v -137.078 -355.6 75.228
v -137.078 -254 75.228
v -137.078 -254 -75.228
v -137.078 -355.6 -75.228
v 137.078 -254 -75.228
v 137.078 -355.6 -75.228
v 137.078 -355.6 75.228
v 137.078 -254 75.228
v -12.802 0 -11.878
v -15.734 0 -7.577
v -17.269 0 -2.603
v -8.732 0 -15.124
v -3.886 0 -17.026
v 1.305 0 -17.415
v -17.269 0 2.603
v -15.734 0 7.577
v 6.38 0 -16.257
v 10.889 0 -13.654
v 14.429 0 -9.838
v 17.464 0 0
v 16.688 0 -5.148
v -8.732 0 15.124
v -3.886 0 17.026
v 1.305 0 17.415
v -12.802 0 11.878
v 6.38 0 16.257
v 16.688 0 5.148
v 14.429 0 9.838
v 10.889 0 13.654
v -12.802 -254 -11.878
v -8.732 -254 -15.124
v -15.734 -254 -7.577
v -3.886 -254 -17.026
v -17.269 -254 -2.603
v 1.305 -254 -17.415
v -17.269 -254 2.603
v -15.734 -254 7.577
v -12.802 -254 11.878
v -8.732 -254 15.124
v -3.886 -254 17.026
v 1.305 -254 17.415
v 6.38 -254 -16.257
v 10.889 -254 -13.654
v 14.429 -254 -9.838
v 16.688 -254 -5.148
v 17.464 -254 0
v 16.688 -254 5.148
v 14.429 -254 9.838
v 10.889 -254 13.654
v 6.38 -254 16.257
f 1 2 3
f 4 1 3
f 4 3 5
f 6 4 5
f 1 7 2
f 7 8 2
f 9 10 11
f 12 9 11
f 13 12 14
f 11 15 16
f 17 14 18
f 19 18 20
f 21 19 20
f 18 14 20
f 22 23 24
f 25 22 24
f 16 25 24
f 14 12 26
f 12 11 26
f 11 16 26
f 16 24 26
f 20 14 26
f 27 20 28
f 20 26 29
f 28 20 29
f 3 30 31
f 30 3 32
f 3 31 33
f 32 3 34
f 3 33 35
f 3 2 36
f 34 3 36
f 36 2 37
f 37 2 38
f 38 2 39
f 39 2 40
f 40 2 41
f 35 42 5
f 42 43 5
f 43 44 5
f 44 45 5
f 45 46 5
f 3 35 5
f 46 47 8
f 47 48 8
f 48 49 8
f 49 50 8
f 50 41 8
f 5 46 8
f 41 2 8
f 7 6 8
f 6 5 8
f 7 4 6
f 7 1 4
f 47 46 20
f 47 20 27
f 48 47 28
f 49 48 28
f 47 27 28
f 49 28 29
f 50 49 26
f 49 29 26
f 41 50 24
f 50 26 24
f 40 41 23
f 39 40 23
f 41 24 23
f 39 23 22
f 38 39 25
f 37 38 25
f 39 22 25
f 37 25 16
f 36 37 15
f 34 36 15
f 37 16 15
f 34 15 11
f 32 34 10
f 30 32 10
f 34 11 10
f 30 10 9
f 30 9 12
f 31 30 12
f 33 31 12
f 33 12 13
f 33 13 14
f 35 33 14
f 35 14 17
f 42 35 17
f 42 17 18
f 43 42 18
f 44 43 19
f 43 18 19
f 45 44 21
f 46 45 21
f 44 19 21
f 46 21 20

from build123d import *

# Parameters (mm, degrees)
F0_R     = 17.4638157323
F1_DEPTH = 254
F3_DEPTH = 76.2
F4_DEPTH = 25.4


with BuildPart() as f1:
    # F0 (on Front) → F1 (new body)
    with BuildSketch(Plane.XZ):
        Circle(F0_R)
    extrude(amount=F1_DEPTH)

    # F2 (on face) → F3 (join)
    with BuildSketch(Plane.XZ.offset(254)):
        with BuildLine():
            Line((-17.4638157323, 0), (0, 0))
            Line((0, 0), (0, 17.4638157323))
            ThreePointArc((0, 17.4638157323), (-12.3487825297, 12.3487825297), (-17.4638157323, 0))
        make_face()
        with BuildLine():
            Line((0, -17.4638157323), (0, 0))
            Line((0, 0), (-17.4638157323, 0))
            ThreePointArc((-17.4638157323, 0), (-12.3487825297, -12.3487825297), (0, -17.4638157323))
        make_face()
        with BuildLine():
            ThreePointArc((0, -17.4638157323), (-12.3487825297, -12.3487825297), (-17.4638157323, 0))
            Line((-17.4638157323, 0), (-137.0784789324, 0))
            Line((-137.0784789324, 0), (-137.0784789324, -75.2277523279))
            Line((-137.0784789324, -75.2277523279), (0, -75.2277523279))
            Line((0, -75.2277523279), (0, -17.4638157323))
        make_face()
        with BuildLine():
            Line((0, 17.4638157323), (0, 0))
            Line((0, 0), (17.4638157323, 0))
            ThreePointArc((17.4638157323, 0), (12.3487825297, 12.3487825297), (0, 17.4638157323))
        make_face()
        with BuildLine():
            Line((0, 75.2277523279), (0, 17.4638157323))
            ThreePointArc((0, 17.4638157323), (12.3487825297, 12.3487825297), (17.4638157323, 0))
            Line((17.4638157323, 0), (137.0784789324, 0))
            Line((137.0784789324, 0), (137.0784789324, 75.2277523279))
            Line((137.0784789324, 75.2277523279), (0, 75.2277523279))
        make_face()
        with BuildLine():
            Line((137.0784789324, 0), (17.4638157323, 0))
            ThreePointArc((17.4638157323, 0), (12.3487825297, -12.3487825297), (0, -17.4638157323))
            Line((0, -17.4638157323), (0, -75.2277523279))
            Line((0, -75.2277523279), (137.0784789324, -75.2277523279))
            Line((137.0784789324, -75.2277523279), (137.0784789324, 0))
        make_face()
        with BuildLine():
            Line((17.4638157323, 0), (0, 0))
            Line((0, 0), (0, -17.4638157323))
            ThreePointArc((0, -17.4638157323), (12.3487825297, -12.3487825297), (17.4638157323, 0))
        make_face()
        with BuildLine():
            Line((-137.0784789324, 0), (-17.4638157323, 0))
            ThreePointArc((-17.4638157323, 0), (-12.3487825297, 12.3487825297), (0, 17.4638157323))
            Line((0, 17.4638157323), (0, 75.2277523279))
            Line((0, 75.2277523279), (-137.0784789324, 75.2277523279))
            Line((-137.0784789324, 75.2277523279), (-137.0784789324, 0))
        make_face()
    extrude(amount=F3_DEPTH)

    # F4 (add): a face of the model
    f4_faces = [f1.faces().sort_by_distance(p)[0] for p in [
        (0, -330.2, 0),
    ]]
    extrude(f4_faces, amount=F4_DEPTH)


solid = f1.part
